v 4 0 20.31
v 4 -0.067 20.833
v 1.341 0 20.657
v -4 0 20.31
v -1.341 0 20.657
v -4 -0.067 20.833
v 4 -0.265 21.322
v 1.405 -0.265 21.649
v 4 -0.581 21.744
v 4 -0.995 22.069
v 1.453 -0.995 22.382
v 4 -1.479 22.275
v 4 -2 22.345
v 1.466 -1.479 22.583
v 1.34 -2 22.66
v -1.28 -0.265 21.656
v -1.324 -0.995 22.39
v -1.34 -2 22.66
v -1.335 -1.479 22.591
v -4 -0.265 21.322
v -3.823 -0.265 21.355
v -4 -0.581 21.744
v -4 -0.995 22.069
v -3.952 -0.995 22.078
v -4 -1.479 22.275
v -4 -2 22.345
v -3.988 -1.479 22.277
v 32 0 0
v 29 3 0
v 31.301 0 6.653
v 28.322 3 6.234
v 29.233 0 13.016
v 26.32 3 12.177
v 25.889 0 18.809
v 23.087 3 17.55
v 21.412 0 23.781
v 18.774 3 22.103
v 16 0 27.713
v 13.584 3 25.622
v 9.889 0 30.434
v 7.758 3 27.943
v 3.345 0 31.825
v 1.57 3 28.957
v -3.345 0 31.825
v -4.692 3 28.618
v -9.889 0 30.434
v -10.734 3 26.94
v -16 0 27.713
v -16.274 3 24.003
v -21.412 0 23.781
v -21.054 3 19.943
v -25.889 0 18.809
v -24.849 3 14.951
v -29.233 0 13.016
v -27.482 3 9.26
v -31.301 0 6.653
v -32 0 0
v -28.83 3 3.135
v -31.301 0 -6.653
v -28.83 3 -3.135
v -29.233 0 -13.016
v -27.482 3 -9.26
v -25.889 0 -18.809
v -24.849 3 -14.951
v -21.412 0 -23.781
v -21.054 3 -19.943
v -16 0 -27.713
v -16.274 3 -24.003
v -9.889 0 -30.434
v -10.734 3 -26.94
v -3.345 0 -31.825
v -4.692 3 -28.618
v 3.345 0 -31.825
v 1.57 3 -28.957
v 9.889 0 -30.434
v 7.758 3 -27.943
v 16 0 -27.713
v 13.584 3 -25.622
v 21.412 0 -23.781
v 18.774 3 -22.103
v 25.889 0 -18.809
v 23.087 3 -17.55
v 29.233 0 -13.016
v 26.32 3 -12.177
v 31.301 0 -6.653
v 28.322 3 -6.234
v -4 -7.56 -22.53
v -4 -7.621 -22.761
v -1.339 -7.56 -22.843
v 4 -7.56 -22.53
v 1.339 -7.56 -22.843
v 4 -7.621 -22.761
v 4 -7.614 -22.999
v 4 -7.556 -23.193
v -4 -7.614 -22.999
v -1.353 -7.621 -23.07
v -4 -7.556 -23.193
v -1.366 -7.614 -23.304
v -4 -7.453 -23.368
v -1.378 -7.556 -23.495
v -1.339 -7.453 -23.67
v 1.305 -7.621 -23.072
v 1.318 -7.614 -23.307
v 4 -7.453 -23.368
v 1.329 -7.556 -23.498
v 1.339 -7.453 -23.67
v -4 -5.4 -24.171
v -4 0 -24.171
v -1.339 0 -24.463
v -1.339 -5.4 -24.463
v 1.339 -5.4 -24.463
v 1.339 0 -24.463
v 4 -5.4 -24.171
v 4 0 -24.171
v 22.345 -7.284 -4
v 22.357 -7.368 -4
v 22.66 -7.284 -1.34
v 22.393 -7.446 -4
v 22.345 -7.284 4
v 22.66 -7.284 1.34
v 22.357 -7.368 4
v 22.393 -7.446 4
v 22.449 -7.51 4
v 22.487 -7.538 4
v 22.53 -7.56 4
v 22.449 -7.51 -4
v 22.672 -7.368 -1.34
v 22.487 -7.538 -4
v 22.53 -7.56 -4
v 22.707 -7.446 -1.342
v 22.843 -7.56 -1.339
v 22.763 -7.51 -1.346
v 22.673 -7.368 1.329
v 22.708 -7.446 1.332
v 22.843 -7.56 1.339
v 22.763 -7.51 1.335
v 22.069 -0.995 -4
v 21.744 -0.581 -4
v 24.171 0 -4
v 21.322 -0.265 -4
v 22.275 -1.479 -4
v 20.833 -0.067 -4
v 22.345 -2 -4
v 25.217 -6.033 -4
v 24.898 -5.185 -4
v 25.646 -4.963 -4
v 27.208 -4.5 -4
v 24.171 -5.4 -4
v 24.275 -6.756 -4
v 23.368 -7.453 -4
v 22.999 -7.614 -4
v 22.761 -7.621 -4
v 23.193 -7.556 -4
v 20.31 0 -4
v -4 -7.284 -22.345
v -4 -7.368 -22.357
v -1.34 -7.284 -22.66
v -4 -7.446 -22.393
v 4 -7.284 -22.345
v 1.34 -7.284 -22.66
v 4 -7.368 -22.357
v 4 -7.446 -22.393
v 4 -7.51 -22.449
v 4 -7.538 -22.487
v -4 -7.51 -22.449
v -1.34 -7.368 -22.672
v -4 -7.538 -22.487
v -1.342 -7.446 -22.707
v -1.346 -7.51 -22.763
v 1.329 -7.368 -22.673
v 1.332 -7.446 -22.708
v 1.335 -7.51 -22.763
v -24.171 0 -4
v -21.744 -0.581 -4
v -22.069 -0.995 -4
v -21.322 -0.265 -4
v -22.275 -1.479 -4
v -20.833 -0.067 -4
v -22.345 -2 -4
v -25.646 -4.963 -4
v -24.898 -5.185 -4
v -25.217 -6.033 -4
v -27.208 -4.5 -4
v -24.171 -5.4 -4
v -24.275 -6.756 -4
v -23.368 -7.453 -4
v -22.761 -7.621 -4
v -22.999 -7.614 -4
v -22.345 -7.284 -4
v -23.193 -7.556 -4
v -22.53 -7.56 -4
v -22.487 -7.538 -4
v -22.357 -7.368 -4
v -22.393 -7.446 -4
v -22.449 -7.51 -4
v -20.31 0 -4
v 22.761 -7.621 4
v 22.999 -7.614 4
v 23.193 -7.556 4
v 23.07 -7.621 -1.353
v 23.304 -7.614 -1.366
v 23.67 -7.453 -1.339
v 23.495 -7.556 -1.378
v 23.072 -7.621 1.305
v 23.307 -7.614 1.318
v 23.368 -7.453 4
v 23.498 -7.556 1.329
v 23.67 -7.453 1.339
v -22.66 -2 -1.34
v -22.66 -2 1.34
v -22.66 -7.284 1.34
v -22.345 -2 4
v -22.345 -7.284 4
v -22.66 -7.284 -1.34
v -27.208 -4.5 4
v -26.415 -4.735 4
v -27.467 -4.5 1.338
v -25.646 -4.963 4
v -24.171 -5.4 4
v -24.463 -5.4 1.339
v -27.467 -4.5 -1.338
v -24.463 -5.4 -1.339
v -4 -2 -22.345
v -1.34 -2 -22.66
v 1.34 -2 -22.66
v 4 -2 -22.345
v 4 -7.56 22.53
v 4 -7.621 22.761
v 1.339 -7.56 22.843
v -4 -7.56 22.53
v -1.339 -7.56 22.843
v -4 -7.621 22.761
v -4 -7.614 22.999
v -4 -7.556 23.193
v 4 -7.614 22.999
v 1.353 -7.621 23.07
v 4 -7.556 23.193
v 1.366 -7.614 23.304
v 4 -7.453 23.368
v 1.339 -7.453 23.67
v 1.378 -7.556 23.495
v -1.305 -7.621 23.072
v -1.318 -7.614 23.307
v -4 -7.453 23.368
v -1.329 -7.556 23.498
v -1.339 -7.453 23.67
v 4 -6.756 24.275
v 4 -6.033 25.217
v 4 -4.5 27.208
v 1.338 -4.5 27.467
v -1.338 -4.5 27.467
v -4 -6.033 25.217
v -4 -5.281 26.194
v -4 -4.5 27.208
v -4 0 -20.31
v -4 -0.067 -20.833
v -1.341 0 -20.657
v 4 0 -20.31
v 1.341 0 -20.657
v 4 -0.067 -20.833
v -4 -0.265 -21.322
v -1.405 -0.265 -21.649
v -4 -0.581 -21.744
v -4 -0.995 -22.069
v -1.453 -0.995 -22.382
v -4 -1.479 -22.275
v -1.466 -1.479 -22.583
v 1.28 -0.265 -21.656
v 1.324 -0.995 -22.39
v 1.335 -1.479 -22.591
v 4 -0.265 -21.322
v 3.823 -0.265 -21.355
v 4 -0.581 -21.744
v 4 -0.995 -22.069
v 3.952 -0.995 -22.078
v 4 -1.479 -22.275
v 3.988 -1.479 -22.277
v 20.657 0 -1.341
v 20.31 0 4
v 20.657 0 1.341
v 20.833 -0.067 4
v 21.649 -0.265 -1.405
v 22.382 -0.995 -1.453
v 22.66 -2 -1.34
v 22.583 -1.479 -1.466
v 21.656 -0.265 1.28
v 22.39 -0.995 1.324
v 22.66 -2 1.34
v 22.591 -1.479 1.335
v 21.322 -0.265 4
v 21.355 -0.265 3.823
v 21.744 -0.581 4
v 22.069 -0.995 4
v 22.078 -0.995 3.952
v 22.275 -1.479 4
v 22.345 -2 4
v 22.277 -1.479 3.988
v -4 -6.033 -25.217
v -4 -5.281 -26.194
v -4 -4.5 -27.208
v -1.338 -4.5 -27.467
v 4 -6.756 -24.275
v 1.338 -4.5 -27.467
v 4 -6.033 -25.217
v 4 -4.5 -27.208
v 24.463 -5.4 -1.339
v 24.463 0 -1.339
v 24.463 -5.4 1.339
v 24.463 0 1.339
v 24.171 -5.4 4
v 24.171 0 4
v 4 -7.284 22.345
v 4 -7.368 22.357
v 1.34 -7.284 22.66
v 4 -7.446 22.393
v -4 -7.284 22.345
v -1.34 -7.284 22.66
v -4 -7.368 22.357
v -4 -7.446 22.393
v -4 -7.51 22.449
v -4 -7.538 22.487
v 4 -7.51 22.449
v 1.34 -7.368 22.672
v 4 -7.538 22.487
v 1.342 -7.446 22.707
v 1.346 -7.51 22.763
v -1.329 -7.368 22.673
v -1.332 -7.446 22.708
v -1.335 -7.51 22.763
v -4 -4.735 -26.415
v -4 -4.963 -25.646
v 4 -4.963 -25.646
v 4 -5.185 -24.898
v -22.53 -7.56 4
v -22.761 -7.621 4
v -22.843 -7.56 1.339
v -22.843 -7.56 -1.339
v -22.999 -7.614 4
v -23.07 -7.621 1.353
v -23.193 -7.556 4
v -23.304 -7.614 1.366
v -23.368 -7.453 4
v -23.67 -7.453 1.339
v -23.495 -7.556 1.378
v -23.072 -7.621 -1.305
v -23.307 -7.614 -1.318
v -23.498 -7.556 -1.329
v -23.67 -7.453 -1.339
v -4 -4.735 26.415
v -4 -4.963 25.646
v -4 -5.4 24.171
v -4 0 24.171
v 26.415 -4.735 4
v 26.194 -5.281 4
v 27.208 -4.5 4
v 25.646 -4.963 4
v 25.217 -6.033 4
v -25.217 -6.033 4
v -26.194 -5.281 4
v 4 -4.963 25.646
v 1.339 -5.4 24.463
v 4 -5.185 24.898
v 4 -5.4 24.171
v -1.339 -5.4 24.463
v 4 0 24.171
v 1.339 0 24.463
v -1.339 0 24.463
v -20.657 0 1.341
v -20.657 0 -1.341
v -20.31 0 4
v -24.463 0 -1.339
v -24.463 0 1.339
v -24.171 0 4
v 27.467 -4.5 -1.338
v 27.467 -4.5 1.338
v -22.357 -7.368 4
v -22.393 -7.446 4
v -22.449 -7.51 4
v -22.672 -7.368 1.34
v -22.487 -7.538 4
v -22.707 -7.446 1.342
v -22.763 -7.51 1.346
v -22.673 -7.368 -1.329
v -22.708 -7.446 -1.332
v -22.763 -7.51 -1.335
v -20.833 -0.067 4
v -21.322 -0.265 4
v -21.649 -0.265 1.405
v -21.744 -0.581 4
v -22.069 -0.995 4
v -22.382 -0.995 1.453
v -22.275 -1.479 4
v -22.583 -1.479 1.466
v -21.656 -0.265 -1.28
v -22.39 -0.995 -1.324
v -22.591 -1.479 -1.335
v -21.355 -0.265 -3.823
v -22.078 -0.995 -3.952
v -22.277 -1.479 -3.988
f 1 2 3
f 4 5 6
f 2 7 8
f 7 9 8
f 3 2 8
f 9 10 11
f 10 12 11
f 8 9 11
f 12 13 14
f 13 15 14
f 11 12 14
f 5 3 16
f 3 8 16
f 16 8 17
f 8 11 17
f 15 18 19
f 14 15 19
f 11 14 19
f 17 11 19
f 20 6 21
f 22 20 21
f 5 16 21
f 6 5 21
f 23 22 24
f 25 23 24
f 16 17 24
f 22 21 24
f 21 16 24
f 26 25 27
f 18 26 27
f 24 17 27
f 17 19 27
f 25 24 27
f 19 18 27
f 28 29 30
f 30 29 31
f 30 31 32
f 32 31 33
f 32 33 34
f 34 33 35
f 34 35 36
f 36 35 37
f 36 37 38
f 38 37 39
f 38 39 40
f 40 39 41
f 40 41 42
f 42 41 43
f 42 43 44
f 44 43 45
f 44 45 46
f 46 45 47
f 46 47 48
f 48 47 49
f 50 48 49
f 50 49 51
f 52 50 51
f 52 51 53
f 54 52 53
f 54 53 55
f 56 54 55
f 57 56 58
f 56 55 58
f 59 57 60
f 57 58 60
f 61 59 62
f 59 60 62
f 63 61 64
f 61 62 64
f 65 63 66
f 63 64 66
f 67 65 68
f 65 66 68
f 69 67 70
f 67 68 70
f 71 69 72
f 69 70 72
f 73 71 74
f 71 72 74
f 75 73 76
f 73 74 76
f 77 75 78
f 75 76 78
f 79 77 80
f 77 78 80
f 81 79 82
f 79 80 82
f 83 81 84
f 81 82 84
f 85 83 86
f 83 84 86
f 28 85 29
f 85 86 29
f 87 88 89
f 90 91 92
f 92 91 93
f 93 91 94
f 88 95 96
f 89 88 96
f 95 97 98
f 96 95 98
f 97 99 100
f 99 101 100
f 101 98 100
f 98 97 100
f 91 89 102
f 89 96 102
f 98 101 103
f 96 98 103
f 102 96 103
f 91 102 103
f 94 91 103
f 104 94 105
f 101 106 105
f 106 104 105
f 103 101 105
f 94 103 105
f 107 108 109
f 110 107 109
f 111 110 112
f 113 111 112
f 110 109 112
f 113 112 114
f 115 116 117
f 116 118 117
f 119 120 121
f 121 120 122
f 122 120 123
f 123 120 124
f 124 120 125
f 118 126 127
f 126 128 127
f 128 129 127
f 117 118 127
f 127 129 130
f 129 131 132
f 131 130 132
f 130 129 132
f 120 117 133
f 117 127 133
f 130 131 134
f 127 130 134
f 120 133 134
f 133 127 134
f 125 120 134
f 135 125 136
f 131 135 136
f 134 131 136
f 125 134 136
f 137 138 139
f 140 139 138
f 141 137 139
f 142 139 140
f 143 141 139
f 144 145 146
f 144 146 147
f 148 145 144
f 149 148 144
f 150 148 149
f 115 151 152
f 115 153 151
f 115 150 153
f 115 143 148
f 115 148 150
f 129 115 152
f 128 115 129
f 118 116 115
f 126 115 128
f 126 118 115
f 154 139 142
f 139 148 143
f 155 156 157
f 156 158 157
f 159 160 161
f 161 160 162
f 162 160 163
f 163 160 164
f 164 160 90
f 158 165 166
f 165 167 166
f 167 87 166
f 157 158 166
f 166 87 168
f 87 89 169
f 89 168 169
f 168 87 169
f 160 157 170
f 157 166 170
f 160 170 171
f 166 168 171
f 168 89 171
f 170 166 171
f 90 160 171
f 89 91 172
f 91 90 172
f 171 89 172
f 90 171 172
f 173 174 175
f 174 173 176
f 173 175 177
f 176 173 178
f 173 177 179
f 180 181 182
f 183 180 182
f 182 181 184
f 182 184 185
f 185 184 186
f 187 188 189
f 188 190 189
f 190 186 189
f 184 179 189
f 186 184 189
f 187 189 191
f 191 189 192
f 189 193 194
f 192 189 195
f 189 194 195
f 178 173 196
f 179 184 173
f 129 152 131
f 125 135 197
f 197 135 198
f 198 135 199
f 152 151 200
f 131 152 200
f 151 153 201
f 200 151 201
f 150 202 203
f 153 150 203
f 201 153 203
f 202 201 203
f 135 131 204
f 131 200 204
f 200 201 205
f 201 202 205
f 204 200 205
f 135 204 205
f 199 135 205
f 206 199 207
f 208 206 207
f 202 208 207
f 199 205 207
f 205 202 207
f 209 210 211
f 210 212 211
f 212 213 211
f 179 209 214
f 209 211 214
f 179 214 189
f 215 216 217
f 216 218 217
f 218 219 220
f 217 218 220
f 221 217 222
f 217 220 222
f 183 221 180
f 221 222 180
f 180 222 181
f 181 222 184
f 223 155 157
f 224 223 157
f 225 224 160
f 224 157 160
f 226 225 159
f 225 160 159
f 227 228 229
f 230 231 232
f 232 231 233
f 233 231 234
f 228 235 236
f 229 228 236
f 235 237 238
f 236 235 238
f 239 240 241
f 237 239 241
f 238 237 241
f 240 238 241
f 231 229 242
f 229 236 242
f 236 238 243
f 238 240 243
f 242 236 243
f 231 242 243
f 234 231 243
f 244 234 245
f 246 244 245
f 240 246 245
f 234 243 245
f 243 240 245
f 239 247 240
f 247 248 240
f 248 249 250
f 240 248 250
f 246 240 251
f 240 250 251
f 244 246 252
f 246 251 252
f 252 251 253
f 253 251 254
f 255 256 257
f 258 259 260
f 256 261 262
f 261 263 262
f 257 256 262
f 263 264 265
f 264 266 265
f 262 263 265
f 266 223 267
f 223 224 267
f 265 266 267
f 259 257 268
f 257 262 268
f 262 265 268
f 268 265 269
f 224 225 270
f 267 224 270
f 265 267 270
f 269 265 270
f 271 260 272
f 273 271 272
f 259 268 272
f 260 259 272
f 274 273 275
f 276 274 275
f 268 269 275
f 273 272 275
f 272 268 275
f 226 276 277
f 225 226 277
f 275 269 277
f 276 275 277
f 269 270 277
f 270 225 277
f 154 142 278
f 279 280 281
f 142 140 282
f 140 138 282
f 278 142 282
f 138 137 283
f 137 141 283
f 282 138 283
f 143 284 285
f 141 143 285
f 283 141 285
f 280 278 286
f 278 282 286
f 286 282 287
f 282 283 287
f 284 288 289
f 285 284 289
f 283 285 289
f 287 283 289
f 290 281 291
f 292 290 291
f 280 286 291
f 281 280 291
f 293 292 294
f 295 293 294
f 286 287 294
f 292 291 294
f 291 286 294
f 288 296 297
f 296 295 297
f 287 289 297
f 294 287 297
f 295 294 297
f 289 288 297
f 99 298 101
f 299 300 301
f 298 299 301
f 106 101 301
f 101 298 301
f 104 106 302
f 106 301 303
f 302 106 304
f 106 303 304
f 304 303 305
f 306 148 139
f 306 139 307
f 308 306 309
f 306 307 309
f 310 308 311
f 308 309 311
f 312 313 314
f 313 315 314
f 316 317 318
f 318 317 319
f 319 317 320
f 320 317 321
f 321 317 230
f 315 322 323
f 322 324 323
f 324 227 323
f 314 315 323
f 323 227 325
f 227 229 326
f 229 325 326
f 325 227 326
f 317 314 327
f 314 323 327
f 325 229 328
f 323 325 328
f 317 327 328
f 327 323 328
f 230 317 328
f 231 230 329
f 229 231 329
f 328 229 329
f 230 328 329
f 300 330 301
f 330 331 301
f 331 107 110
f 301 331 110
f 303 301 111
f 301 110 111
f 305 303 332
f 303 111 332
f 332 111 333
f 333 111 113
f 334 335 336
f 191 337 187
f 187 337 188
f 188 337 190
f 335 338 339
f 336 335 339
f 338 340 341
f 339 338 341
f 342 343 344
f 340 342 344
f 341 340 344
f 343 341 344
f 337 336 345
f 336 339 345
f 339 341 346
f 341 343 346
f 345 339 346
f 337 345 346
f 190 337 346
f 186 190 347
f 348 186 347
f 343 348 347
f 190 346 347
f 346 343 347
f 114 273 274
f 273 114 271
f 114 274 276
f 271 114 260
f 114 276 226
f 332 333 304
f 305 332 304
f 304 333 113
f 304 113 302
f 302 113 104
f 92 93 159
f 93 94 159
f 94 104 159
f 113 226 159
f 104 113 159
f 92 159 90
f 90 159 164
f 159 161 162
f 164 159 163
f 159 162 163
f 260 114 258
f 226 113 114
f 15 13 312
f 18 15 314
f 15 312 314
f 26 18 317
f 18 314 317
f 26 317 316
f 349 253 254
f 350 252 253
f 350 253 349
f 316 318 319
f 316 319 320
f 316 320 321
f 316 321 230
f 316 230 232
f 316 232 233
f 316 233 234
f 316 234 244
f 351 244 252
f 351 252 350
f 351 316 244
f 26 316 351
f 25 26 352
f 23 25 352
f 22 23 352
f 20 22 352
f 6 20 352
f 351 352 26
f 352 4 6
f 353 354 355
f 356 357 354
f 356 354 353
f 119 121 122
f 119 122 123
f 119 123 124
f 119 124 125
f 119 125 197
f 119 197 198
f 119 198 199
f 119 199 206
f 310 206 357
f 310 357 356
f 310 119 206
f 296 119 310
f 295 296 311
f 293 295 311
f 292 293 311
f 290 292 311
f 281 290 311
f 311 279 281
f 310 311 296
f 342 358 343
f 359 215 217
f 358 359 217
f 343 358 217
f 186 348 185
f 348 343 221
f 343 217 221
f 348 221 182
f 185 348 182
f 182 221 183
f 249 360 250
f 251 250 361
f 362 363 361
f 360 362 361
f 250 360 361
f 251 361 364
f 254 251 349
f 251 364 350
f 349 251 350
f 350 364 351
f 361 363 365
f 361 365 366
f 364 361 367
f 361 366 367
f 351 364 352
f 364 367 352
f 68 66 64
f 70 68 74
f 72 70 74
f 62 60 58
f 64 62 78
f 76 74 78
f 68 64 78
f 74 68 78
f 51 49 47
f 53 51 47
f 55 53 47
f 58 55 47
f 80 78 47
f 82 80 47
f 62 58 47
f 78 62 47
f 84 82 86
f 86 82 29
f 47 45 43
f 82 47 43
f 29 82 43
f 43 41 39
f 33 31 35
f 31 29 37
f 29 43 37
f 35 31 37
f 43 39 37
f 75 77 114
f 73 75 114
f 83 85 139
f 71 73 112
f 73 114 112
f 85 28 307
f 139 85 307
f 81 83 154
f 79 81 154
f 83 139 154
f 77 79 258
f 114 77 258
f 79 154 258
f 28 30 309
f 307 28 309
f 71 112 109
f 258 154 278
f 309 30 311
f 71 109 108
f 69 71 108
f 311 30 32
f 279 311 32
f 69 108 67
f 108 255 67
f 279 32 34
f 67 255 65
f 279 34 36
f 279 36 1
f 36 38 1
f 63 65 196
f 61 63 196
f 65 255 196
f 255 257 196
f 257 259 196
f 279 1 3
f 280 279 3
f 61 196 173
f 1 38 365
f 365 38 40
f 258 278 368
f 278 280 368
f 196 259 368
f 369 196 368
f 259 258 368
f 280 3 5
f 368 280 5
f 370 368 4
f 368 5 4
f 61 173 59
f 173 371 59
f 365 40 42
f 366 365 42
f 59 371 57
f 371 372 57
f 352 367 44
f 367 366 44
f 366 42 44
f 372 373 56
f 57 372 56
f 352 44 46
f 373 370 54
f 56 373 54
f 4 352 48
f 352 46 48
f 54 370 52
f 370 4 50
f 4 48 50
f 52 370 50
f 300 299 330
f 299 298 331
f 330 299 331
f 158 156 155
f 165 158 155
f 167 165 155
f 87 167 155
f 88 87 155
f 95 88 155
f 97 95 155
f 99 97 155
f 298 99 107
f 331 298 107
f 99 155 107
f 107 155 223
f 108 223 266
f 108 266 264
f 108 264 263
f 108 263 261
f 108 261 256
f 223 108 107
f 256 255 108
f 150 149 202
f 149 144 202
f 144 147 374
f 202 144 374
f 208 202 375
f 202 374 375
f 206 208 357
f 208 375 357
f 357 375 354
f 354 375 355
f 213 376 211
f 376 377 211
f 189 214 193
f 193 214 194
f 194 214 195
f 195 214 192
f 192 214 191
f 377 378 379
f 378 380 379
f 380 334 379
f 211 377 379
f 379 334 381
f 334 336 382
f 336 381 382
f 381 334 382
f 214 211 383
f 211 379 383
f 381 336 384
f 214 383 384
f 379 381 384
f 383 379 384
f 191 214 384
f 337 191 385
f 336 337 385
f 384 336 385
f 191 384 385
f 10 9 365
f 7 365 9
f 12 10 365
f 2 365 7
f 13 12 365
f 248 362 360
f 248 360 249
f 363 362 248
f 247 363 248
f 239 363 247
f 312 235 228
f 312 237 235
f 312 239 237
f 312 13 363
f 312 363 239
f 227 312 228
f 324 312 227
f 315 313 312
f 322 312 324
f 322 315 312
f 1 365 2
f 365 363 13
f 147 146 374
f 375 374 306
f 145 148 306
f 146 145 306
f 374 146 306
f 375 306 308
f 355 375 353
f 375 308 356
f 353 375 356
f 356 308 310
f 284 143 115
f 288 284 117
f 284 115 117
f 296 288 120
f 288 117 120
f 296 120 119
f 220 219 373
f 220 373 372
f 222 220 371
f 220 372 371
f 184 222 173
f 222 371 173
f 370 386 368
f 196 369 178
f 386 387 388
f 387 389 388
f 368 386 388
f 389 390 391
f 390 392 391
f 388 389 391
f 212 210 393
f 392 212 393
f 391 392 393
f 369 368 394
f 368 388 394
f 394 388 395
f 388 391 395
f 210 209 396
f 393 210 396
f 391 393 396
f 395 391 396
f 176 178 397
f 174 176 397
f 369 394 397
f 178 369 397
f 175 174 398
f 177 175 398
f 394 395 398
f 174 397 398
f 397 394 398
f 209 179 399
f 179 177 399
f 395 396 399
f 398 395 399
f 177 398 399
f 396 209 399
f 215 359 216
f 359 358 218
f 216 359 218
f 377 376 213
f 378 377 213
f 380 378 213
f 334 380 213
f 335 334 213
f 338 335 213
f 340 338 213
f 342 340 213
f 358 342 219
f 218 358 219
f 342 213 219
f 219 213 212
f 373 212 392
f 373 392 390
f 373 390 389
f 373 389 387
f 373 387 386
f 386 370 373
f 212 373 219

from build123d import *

# Parameters (mm, degrees)
F3_DEPTH      = 32.001
F3_DEPTH_BACK = 32.001
F5_DEPTH      = 32.001
F5_DEPTH_BACK = 32.001


# Not quite as in the source:
# - a feature names something its author has since deleted; it is built from what else it names


with BuildPart() as f1:
    # F0 (on Top) → F1 (revolve)
    with BuildSketch(Plane.XY):
        with BuildLine():
            Line((29, 3), (0, 3))
            Line((0, 3), (0, 0))
            Line((0, 0), (20.7, 0))
            ThreePointArc((20.7, 0), (22.1142135624, -0.5857864376), (22.7, -2))
            Line((22.7, -2), (22.7, -7.2844397868))
            ThreePointArc((22.7, -7.2844397868), (22.7497180358, -7.4498451628), (22.8823929227, -7.5604263361))
            ThreePointArc((22.8823929227, -7.5604263361), (23.3097624273, -7.6192211516), (23.7078530386, -7.45301228))
            Line((23.7078530386, -7.45301228), (27.5, -4.5))
            Line((27.5, -4.5), (24.5, -5.4))
            Line((24.5, -5.4), (24.5, -3))
            Line((24.5, -3), (24.5, 0))
            Line((24.5, 0), (32, 0))
            Line((32, 0), (29, 3))
        make_face()
    revolve(axis=Axis((0, -3.2623065636, 0), (0, -1, 0)))

    # F2 (on Top) → F3 (cut, two sides)
    with BuildSketch(Plane.XY) as f3_sk:
        with BuildLine():
            Line((-4, 0), (-18, 0))
            ThreePointArc((-18, 0), (-20.8284271247, -1.1715728753), (-22, -4))
            Line((-22, -4), (-22, -24.4516061772))
            Line((-22, -24.4516061772), (-4, -24.4516061772))
            Line((-4, -24.4516061772), (-4, 0))
        make_face()
        with BuildLine():
            Line((18, 0), (4, 0))
            Line((4, 0), (4, -24.4516061772))
            Line((4, -24.4516061772), (22, -24.4516061772))
            Line((22, -24.4516061772), (22, -4))
            ThreePointArc((22, -4), (20.8284271247, -1.1715728753), (18, 0))
        make_face()
    extrude(amount=-F3_DEPTH, mode=Mode.SUBTRACT)
    extrude(f3_sk.sketch, amount=F3_DEPTH_BACK, mode=Mode.SUBTRACT)

    # F4 (on Right) → F5 (cut, two sides)
    with BuildSketch(Plane.YZ) as f5_sk:
        with BuildLine():
            Line((-9.7492614017, 4), (0, 4))
            Line((0, 4), (0, 18))
            ThreePointArc((0, 18), (-1.1715728753, 20.8284271247), (-4, 22))
            Line((-4, 22), (-9.7492614017, 22))
            Line((-9.7492614017, 22), (-9.7492614017, 4))
        make_face()
        with BuildLine():
            Line((0, -18), (0, -4))
            Line((0, -4), (-9.764377423, -4))
            Line((-9.764377423, -4), (-9.764377423, -22))
            Line((-9.764377423, -22), (-4, -22))
            ThreePointArc((-4, -22), (-1.1715728753, -20.8284271247), (0, -18))
        make_face()
    extrude(amount=-F5_DEPTH, mode=Mode.SUBTRACT)
    extrude(f5_sk.sketch, amount=F5_DEPTH_BACK, mode=Mode.SUBTRACT)


solid = f1.part
